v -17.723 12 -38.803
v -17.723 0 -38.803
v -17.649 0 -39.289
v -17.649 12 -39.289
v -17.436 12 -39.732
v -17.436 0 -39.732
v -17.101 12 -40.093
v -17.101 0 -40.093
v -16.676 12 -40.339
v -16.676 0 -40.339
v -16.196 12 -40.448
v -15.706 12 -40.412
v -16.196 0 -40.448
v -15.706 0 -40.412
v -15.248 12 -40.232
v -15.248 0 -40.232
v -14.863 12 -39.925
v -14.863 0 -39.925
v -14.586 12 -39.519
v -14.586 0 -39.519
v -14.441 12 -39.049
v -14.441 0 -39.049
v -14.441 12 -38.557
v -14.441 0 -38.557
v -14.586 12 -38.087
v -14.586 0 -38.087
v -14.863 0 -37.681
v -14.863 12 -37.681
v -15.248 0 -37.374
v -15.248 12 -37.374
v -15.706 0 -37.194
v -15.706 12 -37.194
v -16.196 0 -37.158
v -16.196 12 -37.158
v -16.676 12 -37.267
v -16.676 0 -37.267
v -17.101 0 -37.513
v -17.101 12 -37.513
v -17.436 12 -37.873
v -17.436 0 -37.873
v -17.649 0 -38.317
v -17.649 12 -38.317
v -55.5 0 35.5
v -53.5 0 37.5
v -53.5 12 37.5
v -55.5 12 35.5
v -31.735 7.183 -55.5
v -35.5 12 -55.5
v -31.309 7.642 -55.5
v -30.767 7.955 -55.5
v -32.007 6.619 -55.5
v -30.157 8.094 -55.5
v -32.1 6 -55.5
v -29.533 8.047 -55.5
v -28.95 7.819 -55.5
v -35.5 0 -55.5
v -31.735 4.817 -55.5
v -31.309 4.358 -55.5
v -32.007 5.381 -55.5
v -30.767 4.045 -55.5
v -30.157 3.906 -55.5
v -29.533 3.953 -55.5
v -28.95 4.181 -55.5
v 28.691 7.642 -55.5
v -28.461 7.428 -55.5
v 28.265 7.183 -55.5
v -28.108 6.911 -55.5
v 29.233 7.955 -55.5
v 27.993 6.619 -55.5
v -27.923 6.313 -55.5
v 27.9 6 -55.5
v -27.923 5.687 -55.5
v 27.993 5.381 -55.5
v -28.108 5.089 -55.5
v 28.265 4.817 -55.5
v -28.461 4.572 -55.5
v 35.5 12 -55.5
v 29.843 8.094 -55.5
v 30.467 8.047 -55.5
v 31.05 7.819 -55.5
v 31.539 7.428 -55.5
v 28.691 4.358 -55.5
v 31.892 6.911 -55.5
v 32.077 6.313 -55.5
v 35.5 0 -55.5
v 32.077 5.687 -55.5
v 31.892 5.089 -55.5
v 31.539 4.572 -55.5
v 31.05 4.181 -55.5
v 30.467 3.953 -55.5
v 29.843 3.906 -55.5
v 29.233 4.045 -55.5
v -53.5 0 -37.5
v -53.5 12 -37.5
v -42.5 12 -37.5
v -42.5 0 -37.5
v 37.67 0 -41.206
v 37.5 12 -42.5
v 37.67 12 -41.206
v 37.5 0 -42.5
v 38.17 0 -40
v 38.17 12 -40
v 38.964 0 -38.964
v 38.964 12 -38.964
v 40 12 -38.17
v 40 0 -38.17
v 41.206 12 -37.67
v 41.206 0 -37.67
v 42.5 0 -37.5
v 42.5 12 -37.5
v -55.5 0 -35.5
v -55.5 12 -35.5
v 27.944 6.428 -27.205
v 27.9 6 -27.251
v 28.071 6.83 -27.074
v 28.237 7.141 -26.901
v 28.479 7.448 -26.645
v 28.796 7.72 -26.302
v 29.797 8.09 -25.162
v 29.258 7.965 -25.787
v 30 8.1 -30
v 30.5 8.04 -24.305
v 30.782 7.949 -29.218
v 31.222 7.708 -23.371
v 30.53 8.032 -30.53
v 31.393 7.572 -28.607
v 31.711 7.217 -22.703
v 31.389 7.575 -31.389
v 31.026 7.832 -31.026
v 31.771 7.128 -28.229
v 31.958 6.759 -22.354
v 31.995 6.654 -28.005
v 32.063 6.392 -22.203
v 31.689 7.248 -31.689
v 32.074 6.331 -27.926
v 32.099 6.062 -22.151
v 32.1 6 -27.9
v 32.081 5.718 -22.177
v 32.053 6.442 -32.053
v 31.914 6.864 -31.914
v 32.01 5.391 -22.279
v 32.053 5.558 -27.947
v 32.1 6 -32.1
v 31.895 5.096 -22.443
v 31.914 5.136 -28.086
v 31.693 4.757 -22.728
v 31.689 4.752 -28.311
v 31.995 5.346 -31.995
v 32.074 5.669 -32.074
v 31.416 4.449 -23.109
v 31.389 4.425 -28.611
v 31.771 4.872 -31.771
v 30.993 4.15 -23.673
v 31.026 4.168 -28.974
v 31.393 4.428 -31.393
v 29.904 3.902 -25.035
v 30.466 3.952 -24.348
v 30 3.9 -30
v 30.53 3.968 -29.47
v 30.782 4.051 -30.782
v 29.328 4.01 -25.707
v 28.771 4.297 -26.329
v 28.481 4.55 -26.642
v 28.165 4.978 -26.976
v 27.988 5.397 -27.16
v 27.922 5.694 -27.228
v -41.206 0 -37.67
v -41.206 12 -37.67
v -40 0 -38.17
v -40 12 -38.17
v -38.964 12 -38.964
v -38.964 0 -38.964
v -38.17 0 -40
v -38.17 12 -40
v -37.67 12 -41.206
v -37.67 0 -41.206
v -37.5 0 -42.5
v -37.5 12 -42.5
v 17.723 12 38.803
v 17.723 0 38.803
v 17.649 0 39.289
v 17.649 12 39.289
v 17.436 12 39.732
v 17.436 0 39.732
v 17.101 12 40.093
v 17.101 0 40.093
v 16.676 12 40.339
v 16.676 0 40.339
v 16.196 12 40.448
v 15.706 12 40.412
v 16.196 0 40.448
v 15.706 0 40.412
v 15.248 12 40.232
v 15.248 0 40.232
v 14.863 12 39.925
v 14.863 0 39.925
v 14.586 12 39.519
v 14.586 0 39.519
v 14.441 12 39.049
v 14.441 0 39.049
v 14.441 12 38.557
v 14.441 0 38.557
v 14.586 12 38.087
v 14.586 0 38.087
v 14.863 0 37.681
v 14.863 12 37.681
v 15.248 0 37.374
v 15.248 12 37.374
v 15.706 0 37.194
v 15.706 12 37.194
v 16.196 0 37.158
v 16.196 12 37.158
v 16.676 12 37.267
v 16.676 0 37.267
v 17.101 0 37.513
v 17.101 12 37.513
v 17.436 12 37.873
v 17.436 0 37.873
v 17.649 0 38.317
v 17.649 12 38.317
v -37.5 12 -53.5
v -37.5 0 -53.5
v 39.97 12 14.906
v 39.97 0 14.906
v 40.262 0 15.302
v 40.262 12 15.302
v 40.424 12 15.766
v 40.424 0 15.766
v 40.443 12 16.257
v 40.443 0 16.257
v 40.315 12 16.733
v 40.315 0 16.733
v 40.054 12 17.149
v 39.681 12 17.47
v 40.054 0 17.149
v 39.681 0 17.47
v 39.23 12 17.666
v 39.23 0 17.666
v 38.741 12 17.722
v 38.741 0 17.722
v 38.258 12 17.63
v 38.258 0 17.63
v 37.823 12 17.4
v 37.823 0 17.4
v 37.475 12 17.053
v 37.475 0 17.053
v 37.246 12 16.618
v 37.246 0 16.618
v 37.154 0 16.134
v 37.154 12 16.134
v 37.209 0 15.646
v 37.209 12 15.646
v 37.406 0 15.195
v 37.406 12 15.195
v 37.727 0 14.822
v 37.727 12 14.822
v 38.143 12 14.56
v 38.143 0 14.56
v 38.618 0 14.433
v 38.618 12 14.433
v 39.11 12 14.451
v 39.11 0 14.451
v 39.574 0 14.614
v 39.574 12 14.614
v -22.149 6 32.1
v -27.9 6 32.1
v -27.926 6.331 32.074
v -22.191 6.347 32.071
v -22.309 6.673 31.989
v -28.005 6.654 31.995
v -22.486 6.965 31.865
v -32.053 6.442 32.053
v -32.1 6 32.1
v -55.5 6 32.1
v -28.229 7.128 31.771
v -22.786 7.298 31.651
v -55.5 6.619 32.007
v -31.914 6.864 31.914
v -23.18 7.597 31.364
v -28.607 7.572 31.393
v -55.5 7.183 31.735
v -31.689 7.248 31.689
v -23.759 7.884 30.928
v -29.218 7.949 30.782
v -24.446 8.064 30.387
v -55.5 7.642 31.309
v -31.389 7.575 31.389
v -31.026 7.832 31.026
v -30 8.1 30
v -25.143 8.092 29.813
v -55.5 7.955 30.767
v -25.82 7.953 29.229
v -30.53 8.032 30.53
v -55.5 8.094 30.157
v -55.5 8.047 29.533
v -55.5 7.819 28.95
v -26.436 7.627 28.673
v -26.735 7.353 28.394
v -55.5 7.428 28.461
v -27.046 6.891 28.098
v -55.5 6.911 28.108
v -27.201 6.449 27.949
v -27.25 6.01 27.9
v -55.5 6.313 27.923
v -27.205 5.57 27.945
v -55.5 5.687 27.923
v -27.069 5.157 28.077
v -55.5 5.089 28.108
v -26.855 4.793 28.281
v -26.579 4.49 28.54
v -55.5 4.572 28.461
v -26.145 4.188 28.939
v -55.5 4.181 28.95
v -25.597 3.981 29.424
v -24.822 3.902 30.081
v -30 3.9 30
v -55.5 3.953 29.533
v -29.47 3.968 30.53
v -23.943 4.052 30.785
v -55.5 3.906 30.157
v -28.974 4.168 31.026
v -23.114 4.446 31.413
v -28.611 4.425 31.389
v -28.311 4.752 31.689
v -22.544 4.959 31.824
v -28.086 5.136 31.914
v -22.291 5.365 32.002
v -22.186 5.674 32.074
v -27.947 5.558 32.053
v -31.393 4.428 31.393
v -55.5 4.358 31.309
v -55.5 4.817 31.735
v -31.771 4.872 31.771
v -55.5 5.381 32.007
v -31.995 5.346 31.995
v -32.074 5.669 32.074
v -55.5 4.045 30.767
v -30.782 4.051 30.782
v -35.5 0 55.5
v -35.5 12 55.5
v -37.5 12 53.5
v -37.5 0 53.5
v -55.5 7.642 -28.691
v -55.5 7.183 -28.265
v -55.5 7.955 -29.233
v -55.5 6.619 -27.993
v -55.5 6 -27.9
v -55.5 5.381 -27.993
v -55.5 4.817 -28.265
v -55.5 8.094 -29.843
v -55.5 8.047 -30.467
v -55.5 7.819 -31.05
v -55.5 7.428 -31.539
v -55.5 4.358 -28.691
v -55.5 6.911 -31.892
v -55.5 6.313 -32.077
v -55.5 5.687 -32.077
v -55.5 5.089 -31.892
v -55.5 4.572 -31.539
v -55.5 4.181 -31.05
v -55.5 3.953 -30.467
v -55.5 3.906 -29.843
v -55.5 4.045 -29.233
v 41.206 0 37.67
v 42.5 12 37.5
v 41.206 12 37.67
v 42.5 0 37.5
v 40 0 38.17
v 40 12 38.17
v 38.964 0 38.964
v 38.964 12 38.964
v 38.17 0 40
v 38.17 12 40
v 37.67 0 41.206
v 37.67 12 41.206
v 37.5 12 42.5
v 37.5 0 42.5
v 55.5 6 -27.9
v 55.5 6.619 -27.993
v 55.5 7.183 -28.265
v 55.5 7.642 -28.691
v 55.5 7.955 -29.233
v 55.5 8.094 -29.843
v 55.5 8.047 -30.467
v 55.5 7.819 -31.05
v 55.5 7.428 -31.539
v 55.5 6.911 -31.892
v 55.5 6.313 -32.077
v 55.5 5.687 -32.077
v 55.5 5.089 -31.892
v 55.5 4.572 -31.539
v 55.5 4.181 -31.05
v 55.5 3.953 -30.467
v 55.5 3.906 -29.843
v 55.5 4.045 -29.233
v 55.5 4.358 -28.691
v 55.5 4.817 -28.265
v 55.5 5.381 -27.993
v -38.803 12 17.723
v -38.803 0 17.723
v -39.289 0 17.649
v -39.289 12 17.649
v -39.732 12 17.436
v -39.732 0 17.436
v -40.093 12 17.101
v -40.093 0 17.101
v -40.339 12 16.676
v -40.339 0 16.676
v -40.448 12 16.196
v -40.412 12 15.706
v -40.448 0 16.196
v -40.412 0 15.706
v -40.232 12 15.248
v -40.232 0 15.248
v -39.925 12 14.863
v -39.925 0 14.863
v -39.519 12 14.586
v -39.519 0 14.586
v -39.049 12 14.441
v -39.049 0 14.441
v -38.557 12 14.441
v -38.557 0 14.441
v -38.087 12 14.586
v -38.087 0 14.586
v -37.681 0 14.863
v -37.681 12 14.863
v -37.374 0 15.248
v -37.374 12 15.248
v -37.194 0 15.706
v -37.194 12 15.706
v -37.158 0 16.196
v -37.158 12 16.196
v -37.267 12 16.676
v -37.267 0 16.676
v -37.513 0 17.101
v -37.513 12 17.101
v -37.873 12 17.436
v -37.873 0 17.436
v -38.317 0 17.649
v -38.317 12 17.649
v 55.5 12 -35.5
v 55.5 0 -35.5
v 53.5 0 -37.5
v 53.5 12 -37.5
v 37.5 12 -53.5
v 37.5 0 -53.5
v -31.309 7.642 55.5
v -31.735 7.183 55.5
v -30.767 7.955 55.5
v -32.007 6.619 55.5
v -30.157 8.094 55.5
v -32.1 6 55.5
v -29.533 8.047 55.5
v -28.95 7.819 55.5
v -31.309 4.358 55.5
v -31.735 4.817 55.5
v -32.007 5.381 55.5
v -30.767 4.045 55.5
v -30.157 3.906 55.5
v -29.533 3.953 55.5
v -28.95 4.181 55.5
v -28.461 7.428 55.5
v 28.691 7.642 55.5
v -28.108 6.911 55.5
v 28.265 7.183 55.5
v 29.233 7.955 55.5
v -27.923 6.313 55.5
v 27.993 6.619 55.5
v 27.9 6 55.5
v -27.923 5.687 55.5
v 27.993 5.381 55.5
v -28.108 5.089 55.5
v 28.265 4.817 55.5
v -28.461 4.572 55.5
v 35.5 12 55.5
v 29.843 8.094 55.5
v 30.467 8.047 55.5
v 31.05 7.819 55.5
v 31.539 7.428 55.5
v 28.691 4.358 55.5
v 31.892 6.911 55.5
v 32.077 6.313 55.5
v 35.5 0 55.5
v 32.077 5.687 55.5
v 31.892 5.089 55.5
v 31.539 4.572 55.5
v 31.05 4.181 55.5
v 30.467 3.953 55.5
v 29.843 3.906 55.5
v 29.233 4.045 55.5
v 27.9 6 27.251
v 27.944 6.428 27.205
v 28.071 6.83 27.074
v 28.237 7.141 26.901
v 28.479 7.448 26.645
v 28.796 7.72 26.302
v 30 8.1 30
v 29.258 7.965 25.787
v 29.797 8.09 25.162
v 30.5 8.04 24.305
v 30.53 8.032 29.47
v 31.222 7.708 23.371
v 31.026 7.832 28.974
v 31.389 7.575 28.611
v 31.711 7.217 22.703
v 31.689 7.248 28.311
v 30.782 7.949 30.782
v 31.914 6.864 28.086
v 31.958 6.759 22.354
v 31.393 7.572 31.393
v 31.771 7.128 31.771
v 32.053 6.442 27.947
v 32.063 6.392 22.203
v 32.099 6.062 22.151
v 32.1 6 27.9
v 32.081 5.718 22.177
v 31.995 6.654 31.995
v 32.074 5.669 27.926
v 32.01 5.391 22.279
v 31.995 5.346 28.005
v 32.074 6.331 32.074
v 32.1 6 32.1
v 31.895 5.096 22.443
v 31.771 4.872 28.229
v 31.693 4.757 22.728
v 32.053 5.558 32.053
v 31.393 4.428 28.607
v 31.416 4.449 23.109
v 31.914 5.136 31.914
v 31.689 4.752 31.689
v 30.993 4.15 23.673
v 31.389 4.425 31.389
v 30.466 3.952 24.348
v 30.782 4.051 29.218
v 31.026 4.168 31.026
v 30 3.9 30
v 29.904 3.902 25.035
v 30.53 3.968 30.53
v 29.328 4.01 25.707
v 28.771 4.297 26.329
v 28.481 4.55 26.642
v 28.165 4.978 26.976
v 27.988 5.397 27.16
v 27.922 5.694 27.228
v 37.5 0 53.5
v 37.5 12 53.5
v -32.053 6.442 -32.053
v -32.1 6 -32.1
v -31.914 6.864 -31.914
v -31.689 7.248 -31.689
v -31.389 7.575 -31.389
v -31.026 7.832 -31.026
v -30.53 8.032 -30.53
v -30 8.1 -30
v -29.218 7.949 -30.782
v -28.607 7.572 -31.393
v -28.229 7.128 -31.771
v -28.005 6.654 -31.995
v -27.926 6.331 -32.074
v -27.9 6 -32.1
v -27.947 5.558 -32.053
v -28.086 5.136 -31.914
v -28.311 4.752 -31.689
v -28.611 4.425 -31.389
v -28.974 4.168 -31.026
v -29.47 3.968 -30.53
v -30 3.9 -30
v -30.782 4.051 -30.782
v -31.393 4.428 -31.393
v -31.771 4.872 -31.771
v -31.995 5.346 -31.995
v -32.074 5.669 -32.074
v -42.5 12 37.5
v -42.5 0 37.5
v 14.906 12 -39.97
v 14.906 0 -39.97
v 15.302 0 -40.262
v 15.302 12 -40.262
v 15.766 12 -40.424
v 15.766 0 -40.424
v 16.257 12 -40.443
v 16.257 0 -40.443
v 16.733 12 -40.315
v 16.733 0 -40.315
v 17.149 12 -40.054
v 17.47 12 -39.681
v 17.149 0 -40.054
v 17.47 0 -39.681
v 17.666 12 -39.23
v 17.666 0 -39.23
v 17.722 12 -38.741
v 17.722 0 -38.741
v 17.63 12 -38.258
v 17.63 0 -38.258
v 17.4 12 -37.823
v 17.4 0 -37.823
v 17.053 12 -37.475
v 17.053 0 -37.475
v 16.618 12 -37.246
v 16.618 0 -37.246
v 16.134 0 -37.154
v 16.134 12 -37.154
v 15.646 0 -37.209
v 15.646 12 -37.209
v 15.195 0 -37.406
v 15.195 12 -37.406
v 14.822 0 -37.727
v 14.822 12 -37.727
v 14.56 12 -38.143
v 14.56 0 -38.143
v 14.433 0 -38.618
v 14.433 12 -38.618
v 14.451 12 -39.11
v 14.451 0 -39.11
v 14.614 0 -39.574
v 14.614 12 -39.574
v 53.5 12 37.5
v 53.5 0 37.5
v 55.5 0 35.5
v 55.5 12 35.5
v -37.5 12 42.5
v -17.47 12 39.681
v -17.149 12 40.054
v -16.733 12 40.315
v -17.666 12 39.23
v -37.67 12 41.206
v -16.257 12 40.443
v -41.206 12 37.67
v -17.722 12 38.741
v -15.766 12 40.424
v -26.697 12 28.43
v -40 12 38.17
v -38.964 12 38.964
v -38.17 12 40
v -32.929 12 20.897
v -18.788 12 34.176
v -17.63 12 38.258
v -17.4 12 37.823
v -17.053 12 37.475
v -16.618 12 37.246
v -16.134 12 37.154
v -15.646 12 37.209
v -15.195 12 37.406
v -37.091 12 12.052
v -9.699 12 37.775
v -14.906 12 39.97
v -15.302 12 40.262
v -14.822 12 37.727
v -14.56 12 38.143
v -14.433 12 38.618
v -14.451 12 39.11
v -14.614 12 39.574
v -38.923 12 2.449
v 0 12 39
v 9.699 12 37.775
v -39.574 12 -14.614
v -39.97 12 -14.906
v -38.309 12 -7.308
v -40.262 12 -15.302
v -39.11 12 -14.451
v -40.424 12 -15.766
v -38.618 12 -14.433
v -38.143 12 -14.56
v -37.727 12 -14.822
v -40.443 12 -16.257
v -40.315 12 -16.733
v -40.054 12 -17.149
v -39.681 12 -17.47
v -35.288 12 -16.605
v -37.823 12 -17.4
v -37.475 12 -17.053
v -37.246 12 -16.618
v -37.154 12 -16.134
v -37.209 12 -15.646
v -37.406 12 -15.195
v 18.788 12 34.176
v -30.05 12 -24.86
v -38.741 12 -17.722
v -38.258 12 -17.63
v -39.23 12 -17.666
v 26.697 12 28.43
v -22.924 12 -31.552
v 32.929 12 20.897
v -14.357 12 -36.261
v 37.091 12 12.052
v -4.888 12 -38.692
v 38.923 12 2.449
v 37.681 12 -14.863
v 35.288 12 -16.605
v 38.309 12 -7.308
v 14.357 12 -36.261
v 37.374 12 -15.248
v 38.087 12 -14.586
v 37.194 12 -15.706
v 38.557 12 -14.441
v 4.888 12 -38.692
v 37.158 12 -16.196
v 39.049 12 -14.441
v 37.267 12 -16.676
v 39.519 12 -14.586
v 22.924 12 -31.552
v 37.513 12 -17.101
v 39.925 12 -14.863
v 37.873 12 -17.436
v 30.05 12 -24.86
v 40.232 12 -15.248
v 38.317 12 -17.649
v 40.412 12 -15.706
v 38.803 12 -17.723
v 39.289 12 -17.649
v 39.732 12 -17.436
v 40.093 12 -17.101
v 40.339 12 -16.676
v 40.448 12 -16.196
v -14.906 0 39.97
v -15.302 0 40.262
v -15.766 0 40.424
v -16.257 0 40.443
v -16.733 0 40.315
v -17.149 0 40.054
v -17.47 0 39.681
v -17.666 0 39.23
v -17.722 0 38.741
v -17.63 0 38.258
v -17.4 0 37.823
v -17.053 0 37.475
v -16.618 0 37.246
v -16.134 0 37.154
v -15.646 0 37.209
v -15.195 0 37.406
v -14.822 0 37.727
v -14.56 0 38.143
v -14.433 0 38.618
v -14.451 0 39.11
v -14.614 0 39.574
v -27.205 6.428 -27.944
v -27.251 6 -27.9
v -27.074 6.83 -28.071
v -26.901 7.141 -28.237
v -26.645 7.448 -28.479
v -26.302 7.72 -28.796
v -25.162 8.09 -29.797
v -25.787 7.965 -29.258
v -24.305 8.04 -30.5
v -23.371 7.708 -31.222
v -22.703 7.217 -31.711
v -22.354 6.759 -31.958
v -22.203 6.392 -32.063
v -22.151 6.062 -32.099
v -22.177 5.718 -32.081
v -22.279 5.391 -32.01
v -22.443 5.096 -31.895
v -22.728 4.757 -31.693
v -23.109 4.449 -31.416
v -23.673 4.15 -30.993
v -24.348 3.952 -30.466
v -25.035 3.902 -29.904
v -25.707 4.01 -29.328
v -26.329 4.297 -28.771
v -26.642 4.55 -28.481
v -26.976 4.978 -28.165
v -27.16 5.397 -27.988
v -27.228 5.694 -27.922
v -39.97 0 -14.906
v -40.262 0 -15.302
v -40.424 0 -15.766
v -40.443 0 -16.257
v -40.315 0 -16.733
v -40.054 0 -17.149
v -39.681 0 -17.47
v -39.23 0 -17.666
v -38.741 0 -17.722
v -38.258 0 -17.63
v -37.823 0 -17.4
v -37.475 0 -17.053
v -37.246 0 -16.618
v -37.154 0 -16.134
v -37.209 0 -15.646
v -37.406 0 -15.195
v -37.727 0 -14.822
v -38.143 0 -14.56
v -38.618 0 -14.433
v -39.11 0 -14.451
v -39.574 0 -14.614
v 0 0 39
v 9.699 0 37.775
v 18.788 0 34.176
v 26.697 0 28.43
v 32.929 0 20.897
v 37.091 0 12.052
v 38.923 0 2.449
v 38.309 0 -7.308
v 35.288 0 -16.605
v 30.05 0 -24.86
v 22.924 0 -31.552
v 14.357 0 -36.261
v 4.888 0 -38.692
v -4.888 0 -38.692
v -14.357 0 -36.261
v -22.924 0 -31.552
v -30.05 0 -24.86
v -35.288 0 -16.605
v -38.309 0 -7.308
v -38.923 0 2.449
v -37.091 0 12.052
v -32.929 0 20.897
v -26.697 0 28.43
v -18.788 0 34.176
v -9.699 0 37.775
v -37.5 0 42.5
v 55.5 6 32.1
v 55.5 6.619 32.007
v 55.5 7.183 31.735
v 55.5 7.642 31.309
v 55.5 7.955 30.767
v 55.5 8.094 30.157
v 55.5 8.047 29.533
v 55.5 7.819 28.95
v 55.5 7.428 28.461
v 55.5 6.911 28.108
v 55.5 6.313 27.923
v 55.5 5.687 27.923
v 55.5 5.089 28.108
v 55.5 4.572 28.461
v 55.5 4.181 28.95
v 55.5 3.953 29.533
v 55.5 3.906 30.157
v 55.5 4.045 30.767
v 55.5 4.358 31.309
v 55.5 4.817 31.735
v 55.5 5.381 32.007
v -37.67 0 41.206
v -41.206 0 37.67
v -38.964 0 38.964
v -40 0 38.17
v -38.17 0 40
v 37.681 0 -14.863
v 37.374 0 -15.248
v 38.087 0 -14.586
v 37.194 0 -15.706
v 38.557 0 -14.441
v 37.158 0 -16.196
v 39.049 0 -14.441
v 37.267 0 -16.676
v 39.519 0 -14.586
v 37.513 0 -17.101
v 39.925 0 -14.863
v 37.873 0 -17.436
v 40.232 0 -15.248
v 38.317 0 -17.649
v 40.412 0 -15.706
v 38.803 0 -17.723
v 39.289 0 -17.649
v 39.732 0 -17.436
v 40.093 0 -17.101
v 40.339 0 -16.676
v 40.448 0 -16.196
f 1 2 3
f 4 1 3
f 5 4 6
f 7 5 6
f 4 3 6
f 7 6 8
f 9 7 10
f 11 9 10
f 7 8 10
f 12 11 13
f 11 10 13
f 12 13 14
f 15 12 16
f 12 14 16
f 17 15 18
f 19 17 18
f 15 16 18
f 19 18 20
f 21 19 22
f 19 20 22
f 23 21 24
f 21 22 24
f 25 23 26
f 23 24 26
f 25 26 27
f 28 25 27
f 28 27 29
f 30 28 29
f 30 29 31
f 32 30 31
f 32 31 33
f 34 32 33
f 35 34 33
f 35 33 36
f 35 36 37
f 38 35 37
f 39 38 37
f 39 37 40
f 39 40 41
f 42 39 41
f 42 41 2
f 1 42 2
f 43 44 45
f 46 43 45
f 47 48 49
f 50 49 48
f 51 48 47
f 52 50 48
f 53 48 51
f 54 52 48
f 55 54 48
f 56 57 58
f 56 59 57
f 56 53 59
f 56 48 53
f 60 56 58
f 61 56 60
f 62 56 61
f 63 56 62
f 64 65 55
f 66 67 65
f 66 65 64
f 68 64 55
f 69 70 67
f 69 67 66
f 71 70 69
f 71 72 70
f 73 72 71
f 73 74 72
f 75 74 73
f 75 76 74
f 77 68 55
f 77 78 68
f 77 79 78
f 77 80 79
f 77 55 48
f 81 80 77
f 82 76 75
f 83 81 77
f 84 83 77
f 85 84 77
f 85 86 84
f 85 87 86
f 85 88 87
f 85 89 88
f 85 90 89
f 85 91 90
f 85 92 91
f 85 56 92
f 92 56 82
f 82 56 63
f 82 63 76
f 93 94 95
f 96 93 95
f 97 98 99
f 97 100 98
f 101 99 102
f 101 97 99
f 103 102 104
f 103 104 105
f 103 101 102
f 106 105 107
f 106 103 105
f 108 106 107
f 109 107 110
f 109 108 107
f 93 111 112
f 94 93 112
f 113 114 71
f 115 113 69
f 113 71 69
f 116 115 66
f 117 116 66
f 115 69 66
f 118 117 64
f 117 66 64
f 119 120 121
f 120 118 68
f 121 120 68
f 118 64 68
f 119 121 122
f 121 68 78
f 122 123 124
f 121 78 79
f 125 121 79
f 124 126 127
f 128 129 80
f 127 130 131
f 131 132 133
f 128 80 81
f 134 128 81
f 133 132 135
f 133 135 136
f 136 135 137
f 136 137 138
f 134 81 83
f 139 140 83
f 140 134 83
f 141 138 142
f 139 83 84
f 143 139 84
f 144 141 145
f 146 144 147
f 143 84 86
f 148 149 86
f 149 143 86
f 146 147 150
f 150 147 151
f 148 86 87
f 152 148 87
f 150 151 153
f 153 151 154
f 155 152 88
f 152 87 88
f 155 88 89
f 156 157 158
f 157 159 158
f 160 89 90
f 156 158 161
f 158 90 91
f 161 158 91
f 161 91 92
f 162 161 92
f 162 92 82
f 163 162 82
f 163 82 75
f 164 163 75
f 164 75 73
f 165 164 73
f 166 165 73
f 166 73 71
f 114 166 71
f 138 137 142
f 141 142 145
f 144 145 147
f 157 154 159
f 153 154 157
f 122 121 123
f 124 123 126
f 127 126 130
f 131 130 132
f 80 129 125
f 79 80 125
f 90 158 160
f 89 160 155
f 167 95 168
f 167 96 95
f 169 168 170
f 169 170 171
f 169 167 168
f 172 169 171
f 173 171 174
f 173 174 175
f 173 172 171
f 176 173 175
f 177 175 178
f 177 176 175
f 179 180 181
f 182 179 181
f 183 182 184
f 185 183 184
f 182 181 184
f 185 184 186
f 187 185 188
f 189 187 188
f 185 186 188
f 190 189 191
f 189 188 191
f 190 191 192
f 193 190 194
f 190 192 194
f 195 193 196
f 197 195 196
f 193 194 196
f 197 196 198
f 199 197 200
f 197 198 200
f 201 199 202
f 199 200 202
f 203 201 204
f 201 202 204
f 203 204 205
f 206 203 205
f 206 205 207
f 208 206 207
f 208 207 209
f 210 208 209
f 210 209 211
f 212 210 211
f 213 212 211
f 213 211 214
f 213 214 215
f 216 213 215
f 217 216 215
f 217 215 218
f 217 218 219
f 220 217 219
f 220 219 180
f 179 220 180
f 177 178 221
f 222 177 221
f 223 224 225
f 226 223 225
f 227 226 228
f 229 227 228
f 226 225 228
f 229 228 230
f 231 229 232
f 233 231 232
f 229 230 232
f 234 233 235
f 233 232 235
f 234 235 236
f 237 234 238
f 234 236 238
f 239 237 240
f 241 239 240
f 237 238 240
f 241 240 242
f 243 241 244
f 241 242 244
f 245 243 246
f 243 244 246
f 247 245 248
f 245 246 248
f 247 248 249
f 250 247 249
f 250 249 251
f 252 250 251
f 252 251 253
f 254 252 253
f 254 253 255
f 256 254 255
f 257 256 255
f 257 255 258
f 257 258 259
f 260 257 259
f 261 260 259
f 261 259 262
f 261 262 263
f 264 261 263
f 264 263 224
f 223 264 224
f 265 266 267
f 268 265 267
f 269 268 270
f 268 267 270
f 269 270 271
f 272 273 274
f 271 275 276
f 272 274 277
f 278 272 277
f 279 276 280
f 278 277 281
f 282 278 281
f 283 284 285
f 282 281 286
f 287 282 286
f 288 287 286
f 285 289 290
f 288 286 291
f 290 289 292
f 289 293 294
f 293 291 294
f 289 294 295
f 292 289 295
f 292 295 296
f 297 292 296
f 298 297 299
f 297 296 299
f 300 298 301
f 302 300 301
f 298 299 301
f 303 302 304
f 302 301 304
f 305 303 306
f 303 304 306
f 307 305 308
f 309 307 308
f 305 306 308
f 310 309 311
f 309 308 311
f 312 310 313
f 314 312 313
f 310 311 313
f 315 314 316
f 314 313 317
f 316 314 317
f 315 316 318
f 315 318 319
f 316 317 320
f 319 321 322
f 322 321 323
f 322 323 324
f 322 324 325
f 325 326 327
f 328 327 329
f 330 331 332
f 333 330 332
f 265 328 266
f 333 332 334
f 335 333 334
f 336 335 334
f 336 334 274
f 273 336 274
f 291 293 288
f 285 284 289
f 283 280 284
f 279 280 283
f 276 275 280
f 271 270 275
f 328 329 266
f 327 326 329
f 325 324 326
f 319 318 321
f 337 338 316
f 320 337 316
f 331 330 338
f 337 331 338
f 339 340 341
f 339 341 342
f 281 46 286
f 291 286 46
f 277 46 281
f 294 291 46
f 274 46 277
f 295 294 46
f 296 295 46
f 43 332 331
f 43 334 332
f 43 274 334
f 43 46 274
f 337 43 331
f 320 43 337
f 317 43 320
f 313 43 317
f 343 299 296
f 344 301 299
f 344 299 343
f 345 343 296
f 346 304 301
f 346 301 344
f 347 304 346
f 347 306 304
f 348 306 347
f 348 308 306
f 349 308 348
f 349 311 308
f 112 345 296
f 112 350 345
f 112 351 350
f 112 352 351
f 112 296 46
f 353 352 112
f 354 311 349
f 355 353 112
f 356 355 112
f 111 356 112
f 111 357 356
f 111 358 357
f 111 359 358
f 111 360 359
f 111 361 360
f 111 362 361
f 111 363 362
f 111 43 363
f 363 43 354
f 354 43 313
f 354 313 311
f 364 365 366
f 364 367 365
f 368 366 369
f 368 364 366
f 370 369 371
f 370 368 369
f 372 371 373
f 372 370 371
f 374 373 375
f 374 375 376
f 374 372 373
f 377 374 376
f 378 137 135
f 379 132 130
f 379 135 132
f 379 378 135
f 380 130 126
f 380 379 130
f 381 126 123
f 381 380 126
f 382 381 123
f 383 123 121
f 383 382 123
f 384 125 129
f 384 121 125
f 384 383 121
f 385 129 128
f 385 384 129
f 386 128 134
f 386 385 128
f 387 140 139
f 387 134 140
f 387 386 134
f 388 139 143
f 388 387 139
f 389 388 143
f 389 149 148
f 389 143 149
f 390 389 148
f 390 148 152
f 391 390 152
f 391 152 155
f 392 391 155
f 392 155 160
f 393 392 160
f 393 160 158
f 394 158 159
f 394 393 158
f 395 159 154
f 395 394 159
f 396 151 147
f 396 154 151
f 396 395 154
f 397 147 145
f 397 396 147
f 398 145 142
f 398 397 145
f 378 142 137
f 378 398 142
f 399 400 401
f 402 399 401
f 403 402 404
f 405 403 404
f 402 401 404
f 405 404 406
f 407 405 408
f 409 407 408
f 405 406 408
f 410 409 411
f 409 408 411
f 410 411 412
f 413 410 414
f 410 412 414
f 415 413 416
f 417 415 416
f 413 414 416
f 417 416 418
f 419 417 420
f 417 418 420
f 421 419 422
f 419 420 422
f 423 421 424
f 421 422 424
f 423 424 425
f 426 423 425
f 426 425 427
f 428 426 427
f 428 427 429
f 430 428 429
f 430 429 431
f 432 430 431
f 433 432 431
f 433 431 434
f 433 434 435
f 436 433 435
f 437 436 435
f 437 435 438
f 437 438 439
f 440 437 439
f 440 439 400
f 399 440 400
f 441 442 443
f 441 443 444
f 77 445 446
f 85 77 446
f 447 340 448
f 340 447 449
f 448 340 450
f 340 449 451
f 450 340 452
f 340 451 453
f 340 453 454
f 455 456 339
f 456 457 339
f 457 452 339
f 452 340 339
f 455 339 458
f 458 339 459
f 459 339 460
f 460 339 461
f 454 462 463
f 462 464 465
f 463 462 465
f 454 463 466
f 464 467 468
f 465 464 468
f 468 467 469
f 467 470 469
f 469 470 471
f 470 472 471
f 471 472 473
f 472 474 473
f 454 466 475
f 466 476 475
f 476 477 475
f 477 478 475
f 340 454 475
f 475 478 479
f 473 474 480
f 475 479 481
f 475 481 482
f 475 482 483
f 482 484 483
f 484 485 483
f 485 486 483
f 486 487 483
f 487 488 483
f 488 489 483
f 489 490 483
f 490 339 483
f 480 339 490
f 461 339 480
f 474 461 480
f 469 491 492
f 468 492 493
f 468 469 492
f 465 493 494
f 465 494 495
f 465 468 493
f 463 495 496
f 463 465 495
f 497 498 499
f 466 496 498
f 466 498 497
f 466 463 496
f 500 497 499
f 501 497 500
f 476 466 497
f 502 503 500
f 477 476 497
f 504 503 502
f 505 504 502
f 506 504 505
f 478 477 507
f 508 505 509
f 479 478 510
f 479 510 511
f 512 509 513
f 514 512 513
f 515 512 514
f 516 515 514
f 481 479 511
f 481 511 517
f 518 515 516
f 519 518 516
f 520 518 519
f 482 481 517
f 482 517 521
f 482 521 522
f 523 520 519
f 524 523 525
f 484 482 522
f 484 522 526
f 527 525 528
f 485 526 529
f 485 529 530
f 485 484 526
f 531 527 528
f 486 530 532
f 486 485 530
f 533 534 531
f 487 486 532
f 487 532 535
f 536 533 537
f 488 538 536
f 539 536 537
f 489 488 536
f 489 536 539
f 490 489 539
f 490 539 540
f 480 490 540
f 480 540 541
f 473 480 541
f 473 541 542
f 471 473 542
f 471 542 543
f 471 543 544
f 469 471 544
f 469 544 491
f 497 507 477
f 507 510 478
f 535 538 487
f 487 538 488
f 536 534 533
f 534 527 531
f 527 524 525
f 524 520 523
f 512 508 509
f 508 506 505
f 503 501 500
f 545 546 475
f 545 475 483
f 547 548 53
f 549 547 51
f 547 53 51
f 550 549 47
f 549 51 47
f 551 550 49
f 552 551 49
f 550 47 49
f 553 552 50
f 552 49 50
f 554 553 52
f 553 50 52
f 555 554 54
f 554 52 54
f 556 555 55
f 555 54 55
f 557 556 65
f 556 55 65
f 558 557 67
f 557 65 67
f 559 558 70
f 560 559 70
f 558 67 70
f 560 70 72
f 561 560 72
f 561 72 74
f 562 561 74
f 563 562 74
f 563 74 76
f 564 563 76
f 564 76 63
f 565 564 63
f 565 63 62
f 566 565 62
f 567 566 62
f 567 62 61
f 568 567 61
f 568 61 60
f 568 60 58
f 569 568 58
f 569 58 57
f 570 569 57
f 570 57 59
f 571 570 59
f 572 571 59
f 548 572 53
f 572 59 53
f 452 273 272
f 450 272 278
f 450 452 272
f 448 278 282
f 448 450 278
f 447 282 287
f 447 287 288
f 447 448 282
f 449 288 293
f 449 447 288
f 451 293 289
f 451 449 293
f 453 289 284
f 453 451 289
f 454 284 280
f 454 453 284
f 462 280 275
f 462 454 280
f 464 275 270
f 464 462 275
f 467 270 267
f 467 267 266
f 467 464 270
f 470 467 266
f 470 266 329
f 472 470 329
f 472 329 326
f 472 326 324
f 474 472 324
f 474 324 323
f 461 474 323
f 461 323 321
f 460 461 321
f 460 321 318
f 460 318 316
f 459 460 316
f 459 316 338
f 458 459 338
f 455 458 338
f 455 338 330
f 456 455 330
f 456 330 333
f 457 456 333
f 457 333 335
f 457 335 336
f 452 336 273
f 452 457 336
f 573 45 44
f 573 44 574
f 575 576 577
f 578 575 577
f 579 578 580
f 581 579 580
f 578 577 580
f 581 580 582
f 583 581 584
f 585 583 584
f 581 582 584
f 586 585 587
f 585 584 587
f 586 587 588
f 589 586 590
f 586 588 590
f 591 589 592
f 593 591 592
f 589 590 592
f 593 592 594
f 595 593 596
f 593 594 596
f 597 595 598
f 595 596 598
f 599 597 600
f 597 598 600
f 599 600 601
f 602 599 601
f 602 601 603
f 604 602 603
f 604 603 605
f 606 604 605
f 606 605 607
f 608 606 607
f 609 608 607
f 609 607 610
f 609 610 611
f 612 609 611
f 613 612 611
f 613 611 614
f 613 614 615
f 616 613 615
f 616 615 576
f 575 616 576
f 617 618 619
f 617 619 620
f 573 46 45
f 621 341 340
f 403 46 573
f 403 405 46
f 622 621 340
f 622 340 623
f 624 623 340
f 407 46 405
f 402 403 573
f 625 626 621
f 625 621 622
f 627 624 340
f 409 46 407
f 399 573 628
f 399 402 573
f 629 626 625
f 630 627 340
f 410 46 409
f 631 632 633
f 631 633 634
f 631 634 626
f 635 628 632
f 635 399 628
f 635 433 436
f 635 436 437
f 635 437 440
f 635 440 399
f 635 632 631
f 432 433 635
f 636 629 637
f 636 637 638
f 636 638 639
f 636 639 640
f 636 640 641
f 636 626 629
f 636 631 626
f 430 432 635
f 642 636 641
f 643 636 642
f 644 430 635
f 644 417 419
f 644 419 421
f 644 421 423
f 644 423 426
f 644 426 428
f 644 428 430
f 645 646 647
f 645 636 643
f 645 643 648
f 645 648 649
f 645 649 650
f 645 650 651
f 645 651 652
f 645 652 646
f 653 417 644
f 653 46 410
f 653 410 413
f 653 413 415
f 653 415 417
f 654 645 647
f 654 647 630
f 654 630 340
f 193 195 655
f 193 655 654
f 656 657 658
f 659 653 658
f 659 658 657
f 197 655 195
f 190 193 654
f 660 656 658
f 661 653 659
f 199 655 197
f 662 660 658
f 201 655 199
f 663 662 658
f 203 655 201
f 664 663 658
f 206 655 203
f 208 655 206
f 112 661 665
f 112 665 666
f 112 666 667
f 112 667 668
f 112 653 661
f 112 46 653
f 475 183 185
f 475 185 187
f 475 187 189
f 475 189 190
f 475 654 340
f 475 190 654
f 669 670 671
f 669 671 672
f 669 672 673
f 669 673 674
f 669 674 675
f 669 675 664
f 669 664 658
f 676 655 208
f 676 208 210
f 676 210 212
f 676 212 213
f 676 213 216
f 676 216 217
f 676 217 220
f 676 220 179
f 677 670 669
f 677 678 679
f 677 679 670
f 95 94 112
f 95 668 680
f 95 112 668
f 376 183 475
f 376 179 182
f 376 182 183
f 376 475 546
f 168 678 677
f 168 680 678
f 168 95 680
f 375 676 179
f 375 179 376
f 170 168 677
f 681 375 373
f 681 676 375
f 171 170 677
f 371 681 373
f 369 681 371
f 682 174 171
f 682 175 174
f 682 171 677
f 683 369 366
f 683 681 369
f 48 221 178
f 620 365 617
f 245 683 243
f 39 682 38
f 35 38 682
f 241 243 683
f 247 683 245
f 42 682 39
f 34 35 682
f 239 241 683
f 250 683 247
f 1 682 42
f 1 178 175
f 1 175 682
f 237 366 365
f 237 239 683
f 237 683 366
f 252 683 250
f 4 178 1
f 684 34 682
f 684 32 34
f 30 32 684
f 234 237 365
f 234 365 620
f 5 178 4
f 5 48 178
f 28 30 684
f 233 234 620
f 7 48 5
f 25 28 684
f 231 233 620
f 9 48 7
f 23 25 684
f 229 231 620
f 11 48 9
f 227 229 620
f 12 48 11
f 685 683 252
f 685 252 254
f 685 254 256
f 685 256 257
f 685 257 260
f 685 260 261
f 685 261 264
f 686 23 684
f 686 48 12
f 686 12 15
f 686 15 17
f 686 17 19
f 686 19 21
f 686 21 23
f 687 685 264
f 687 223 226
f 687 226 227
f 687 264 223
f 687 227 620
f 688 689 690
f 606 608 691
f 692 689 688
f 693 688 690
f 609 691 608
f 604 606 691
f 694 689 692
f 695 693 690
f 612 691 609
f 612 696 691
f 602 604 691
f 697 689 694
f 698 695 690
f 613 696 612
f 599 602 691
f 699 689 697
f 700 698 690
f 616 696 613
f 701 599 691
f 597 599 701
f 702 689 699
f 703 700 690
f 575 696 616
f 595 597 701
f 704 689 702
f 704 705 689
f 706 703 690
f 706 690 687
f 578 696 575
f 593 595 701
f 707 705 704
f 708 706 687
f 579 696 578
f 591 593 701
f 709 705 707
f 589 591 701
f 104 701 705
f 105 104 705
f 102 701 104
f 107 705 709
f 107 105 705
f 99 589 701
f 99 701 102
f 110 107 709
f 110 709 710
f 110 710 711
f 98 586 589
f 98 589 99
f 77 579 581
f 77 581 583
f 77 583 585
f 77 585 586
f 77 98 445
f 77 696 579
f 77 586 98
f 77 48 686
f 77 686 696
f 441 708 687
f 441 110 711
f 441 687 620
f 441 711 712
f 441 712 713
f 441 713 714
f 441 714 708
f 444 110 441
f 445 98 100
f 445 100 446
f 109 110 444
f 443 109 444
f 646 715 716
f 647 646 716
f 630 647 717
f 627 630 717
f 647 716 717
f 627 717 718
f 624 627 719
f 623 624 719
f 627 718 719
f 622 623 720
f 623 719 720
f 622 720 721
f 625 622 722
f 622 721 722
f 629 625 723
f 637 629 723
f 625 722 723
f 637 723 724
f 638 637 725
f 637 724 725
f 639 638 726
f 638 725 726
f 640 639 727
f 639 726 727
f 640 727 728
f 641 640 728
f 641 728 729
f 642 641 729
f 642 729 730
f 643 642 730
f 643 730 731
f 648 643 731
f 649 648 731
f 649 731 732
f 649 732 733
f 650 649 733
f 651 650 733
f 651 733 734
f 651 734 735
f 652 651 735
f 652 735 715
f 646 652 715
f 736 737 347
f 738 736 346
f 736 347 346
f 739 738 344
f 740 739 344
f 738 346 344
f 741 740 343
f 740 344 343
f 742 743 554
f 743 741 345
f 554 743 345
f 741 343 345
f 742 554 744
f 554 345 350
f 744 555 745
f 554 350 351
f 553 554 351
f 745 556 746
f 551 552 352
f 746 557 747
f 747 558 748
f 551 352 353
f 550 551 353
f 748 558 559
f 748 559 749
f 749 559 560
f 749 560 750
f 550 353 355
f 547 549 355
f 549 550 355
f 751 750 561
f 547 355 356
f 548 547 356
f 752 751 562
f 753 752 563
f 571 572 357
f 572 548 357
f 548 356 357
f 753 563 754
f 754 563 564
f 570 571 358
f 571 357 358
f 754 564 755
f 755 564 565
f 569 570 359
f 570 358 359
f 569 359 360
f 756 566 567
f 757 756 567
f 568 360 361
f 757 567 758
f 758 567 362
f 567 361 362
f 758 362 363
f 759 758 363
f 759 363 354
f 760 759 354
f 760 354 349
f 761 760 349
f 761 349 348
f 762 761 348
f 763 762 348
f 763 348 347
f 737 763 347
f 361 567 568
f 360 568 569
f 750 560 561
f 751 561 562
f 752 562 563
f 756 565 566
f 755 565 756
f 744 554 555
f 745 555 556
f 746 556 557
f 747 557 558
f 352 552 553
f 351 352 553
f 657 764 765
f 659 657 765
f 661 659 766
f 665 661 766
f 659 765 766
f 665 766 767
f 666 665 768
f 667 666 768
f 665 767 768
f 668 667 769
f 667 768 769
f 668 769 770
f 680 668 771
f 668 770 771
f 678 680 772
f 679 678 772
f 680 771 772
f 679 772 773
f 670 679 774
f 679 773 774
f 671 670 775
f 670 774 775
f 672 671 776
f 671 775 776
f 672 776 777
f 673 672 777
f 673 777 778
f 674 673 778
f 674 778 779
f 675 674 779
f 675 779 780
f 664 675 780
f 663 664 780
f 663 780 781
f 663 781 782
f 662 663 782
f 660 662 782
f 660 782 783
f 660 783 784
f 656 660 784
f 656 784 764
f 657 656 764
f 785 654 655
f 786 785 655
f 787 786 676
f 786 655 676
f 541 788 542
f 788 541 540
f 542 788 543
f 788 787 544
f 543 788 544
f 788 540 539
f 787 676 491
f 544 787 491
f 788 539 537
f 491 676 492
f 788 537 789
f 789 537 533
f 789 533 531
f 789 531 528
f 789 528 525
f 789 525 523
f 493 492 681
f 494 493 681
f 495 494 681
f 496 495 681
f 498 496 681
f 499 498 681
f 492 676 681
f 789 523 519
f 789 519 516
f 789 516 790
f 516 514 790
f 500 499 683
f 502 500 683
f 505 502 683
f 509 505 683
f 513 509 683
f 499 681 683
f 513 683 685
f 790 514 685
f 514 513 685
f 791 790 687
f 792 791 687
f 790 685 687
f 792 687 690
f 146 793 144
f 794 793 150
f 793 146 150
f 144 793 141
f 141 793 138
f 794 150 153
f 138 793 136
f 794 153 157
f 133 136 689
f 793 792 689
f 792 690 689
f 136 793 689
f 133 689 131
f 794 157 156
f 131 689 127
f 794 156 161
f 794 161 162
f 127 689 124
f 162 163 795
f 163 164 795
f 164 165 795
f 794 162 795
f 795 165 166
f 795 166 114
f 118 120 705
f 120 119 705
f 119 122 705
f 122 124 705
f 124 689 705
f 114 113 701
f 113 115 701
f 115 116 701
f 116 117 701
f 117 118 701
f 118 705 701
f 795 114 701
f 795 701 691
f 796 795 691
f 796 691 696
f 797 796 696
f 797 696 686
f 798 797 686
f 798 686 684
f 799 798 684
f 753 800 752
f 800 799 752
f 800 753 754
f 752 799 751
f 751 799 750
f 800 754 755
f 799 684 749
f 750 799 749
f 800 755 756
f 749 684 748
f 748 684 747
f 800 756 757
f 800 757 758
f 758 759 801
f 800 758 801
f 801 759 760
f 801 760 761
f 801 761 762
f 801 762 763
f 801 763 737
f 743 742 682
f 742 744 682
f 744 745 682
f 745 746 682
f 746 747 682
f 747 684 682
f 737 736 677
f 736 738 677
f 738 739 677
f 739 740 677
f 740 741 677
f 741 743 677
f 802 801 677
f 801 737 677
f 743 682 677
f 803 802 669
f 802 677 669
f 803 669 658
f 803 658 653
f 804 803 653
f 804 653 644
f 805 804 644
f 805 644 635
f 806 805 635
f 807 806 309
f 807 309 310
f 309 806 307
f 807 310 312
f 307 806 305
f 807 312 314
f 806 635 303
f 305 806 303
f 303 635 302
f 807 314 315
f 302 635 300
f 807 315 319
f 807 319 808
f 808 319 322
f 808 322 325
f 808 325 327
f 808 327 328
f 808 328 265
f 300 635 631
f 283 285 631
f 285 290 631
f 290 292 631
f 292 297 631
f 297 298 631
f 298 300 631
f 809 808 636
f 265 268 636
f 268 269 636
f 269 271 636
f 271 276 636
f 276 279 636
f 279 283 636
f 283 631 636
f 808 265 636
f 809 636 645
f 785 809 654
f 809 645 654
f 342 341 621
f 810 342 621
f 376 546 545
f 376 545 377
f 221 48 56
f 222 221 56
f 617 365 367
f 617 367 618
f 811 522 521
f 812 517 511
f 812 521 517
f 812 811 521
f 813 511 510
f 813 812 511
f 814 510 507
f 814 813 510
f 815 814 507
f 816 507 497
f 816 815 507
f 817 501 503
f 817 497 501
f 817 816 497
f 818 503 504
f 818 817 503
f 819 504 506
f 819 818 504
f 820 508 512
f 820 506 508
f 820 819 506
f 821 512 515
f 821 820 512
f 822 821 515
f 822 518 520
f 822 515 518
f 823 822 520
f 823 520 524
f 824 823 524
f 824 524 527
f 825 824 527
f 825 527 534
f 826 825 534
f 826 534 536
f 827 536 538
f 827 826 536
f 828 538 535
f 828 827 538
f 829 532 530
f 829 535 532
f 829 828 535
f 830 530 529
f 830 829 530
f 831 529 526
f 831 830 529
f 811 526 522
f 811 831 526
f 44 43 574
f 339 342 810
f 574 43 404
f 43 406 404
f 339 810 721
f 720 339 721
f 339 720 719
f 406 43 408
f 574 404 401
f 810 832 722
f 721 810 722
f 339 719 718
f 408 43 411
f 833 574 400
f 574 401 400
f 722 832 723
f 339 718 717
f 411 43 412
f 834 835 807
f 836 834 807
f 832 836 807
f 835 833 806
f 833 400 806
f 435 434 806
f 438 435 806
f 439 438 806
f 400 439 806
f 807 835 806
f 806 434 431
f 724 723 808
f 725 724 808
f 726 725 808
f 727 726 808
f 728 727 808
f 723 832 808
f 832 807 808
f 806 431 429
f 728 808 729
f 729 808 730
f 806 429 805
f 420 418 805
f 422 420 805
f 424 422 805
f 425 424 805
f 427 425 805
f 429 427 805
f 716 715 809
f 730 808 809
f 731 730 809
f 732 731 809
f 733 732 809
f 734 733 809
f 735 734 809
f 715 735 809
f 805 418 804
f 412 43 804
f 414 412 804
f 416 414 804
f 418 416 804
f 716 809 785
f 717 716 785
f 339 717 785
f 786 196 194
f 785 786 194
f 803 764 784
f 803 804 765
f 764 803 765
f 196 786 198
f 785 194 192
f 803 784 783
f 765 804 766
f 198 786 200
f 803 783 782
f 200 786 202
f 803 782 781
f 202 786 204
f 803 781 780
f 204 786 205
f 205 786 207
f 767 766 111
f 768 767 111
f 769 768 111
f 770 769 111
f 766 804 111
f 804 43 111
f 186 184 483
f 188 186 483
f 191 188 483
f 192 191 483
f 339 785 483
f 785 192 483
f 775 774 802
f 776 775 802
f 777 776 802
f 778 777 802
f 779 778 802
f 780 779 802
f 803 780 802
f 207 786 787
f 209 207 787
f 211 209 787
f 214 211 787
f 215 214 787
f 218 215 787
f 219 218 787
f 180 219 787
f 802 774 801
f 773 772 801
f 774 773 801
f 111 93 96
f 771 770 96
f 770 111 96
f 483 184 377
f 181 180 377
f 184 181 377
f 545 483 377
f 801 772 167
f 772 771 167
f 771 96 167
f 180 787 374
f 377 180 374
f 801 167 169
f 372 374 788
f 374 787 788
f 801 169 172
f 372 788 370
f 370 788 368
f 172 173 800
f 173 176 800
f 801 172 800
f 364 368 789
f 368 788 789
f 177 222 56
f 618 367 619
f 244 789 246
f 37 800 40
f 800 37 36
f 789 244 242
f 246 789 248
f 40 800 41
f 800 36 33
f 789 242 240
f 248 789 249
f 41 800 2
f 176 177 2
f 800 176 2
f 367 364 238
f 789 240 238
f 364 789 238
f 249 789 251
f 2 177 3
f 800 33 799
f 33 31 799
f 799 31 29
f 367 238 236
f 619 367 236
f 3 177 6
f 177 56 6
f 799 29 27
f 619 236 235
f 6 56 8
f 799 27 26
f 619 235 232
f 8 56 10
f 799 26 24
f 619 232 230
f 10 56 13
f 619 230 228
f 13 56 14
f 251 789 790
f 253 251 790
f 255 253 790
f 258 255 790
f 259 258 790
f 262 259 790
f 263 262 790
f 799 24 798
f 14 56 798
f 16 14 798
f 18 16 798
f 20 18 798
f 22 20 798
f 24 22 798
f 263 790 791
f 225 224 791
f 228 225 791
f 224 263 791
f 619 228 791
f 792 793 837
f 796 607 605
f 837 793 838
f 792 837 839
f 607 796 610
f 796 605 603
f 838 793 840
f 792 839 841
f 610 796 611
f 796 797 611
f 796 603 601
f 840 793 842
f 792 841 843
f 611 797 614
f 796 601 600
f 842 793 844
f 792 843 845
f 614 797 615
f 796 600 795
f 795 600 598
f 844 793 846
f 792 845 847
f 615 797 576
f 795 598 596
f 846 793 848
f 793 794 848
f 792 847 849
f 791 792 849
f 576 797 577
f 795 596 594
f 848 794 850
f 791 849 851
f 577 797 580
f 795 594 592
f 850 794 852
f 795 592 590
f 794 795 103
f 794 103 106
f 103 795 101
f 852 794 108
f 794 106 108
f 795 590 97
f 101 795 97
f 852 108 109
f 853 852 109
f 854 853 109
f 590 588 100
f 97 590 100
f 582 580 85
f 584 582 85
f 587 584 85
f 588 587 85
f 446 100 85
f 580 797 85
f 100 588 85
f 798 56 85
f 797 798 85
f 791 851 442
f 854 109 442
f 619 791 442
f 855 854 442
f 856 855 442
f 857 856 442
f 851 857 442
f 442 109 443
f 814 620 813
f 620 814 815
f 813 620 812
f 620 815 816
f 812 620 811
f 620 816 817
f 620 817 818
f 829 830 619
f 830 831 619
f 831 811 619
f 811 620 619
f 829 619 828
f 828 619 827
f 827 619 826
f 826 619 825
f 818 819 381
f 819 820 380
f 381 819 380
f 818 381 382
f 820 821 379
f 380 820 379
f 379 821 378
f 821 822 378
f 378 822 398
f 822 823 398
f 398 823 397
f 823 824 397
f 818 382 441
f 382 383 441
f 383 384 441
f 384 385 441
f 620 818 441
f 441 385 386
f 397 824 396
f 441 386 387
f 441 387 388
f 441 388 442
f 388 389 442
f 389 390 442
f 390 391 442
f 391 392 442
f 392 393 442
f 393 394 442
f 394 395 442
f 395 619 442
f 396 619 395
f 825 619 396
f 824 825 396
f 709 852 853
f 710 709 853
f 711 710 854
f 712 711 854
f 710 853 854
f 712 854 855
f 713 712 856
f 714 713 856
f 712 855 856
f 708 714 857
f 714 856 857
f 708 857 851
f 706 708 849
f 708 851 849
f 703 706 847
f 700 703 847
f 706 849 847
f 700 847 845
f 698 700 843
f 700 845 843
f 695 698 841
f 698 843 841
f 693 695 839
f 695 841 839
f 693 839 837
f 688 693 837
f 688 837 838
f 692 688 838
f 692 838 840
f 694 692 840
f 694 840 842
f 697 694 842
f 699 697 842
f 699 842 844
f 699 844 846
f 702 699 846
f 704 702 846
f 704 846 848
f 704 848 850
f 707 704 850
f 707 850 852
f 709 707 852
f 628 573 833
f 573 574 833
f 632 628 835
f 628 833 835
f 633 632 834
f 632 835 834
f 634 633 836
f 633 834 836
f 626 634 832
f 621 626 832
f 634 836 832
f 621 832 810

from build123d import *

# Parameters (mm, degrees)
SKETCH_1_W               = 111
SKETCH_1_H               = 111
EXTRUDE_1_DEPTH          = 12
SKETCH_2_R               = 39
CUT_EXTRUDE_1_DEPTH      = 80.400881607
HOLE_WIZARD_M4_1_D       = 3.3
PATTERN_CIRCULAR_1_COUNT = 8
SKETCH_8_W               = 36
SKETCH_8_H               = 36
CUT_EXTRUDE_2_DEPTH      = 80.400881607
FILLET_1_R               = 5
CHAMFER_1_SIZE           = 2
HOLE_WIZARD_M5_1_REACH   = 126.681
HOLE_WIZARD_M5_1_BORE_R  = 2.1
HOLE_WIZARD_M5_2_REACH   = 126.681
HOLE_WIZARD_M5_2_BORE_R  = 2.1


with BuildPart() as part:
    # 草图1 → 凸台-拉伸1 (new body)
    with BuildSketch(Plane(origin=(0, 0, 0), x_dir=(1, 0, 0), z_dir=(0, 1, 0))):
        Rectangle(SKETCH_1_W, SKETCH_1_H)
    extrude(amount=EXTRUDE_1_DEPTH)

    # 草图2 → 切除-拉伸1 (cut, through all)
    with BuildSketch(Plane(origin=(0, 12, 0), x_dir=(1, 0, 0), z_dir=(0, 1, 0))):
        with Locations(Location((0, 0, 0), (0, 0, 270))):
            Circle(SKETCH_2_R)
    extrude(amount=-CUT_EXTRUDE_1_DEPTH, mode=Mode.SUBTRACT)

    # M4 螺纹孔1 (through all)
    with Locations(Plane(origin=(0, 12, 0), x_dir=(1, 0, 0), z_dir=(0, 1, 0))):
        with Locations((-16.072704159, 38.802940365)):
            hole_wizard_m4_1 = Hole(HOLE_WIZARD_M4_1_D / 2)

    # 阵列(圆周)1: M4 螺纹孔1 ×8 about axis
    pattern_circular_1_axis = Axis((0, 0, 0), (0, 1, 0))
    for i in range(1, PATTERN_CIRCULAR_1_COUNT):
        add(hole_wizard_m4_1.rotate(pattern_circular_1_axis, i * 360 / PATTERN_CIRCULAR_1_COUNT), mode=Mode.SUBTRACT)

    # 草图8 → 切除-拉伸2 (cut, through all)
    with BuildSketch(Plane(origin=(0, 12, 0), x_dir=(1, 0, 0), z_dir=(0, 1, 0))):
        with Locations((-55.5, 55.5)):
            Rectangle(SKETCH_8_W, SKETCH_8_H)
        with Locations((55.5, 55.5)):
            Rectangle(SKETCH_8_W, SKETCH_8_H)
        with Locations((55.5, -55.5)):
            Rectangle(SKETCH_8_W, SKETCH_8_H)
        with Locations((-55.5, -55.5)):
            Rectangle(SKETCH_8_W, SKETCH_8_H)
    extrude(amount=-CUT_EXTRUDE_2_DEPTH, mode=Mode.SUBTRACT)

    # 圆角1
    fillet_1_edges = [part.edges().sort_by_distance(p)[0] for p in [
        (-37.5, 6, 37.5),
        (37.5, 6, 37.5),
        (-37.5, 6, -37.5),
        (37.5, 6, -37.5),
    ]]
    fillet(fillet_1_edges, radius=FILLET_1_R)

    # 倒角1
    chamfer_1_edges = [part.edges().sort_by_distance(p)[0] for p in [
        (-55.5, 6, 37.5),
        (-37.5, 6, 55.5),
        (37.5, 6, 55.5),
        (55.5, 6, 37.5),
        (-37.5, 6, -55.5),
        (-55.5, 6, -37.5),
        (55.5, 6, -37.5),
        (37.5, 6, -55.5),
    ]]
    chamfer(chamfer_1_edges, length=CHAMFER_1_SIZE)

    # M5 螺纹孔1 bore → M5 螺纹孔1 (cut, up to next)
    with BuildSketch(Plane.ZY.offset(55.5), mode=Mode.PRIVATE) as hole_wizard_m5_1_sk1:
        with Locations((-30, 6)):
            Circle(HOLE_WIZARD_M5_1_BORE_R)
    hole_wizard_m5_1_tool1 = extrude(hole_wizard_m5_1_sk1.sketch, amount=-HOLE_WIZARD_M5_1_REACH, mode=Mode.PRIVATE) & part.part
    # M5 螺纹孔1 bore → M5 螺纹孔1 (cut, up to next)
    with BuildSketch(Plane.ZY.offset(55.5), mode=Mode.PRIVATE) as hole_wizard_m5_1_sk2:
        with Locations((30, 6)):
            Circle(HOLE_WIZARD_M5_1_BORE_R)
    hole_wizard_m5_1_tool2 = extrude(hole_wizard_m5_1_sk2.sketch, amount=-HOLE_WIZARD_M5_1_REACH, mode=Mode.PRIVATE) & part.part
    hole_wizard_m5_1_1 = hole_wizard_m5_1_tool1.solids().sort_by_distance((-55.5, 6, -30))[0]
    add(hole_wizard_m5_1_1, mode=Mode.SUBTRACT)
    hole_wizard_m5_1_2 = hole_wizard_m5_1_tool2.solids().sort_by_distance((-55.5, 6, 30))[0]
    add(hole_wizard_m5_1_2, mode=Mode.SUBTRACT)
    hole_wizard_m5_1 = hole_wizard_m5_1_1 + hole_wizard_m5_1_2  # M5 螺纹孔1 as one shape, for the pattern or mirror that repeats it

    # M5 螺纹孔2 bore → M5 螺纹孔2 (cut, up to next)
    with BuildSketch(Plane(origin=(0, 0, -55.5), x_dir=(-1, 0, 0), z_dir=(0, 0, -1)), mode=Mode.PRIVATE) as hole_wizard_m5_2_sk1:
        with Locations((-30, 6)):
            Circle(HOLE_WIZARD_M5_2_BORE_R)
    hole_wizard_m5_2_tool1 = extrude(hole_wizard_m5_2_sk1.sketch, amount=-HOLE_WIZARD_M5_2_REACH, mode=Mode.PRIVATE) & part.part
    # M5 螺纹孔2 bore → M5 螺纹孔2 (cut, up to next)
    with BuildSketch(Plane(origin=(0, 0, -55.5), x_dir=(-1, 0, 0), z_dir=(0, 0, -1)), mode=Mode.PRIVATE) as hole_wizard_m5_2_sk2:
        with Locations((30, 6)):
            Circle(HOLE_WIZARD_M5_2_BORE_R)
    hole_wizard_m5_2_tool2 = extrude(hole_wizard_m5_2_sk2.sketch, amount=-HOLE_WIZARD_M5_2_REACH, mode=Mode.PRIVATE) & part.part
    hole_wizard_m5_2_1 = hole_wizard_m5_2_tool1.solids().sort_by_distance((30, 6, -55.5))[0]
    add(hole_wizard_m5_2_1, mode=Mode.SUBTRACT)
    hole_wizard_m5_2_2 = hole_wizard_m5_2_tool2.solids().sort_by_distance((-30, 6, -55.5))[0]
    add(hole_wizard_m5_2_2, mode=Mode.SUBTRACT)
    hole_wizard_m5_2 = hole_wizard_m5_2_1 + hole_wizard_m5_2_2  # M5 螺纹孔2 as one shape, for the pattern or mirror that repeats it

    # 镜向1: M5 螺纹孔2 across plane
    add(hole_wizard_m5_2.mirror(Plane.XY), mode=Mode.SUBTRACT)

    # 镜向2: M5 螺纹孔1 mirrored; each copy of M5 螺纹孔1 runs up to whatever stops it at its own place
    mirror_2_before = part.part  # the part as the pattern finds it: every copy runs up to it
    mirror_2_hole_wizard_m5_1_long1 = extrude(hole_wizard_m5_1_sk1.sketch, amount=-HOLE_WIZARD_M5_1_REACH, mode=Mode.PRIVATE)
    mirror_2_hole_wizard_m5_1_long2 = extrude(hole_wizard_m5_1_sk2.sketch, amount=-HOLE_WIZARD_M5_1_REACH, mode=Mode.PRIVATE)
    mirror_2_hole_wizard_m5_1_tool1_1 = mirror_2_hole_wizard_m5_1_long1.mirror(Plane(origin=(0, 0, 0), x_dir=(0, 0, 1), z_dir=(1, 0, 0))) & mirror_2_before
    add(mirror_2_hole_wizard_m5_1_tool1_1.solids().sort_by_distance((55.5, 6, -30))[0], mode=Mode.SUBTRACT)
    mirror_2_hole_wizard_m5_1_tool2_1 = mirror_2_hole_wizard_m5_1_long2.mirror(Plane(origin=(0, 0, 0), x_dir=(0, 0, 1), z_dir=(1, 0, 0))) & mirror_2_before
    add(mirror_2_hole_wizard_m5_1_tool2_1.solids().sort_by_distance((55.5, 6, 30))[0], mode=Mode.SUBTRACT)


solid = part.part
